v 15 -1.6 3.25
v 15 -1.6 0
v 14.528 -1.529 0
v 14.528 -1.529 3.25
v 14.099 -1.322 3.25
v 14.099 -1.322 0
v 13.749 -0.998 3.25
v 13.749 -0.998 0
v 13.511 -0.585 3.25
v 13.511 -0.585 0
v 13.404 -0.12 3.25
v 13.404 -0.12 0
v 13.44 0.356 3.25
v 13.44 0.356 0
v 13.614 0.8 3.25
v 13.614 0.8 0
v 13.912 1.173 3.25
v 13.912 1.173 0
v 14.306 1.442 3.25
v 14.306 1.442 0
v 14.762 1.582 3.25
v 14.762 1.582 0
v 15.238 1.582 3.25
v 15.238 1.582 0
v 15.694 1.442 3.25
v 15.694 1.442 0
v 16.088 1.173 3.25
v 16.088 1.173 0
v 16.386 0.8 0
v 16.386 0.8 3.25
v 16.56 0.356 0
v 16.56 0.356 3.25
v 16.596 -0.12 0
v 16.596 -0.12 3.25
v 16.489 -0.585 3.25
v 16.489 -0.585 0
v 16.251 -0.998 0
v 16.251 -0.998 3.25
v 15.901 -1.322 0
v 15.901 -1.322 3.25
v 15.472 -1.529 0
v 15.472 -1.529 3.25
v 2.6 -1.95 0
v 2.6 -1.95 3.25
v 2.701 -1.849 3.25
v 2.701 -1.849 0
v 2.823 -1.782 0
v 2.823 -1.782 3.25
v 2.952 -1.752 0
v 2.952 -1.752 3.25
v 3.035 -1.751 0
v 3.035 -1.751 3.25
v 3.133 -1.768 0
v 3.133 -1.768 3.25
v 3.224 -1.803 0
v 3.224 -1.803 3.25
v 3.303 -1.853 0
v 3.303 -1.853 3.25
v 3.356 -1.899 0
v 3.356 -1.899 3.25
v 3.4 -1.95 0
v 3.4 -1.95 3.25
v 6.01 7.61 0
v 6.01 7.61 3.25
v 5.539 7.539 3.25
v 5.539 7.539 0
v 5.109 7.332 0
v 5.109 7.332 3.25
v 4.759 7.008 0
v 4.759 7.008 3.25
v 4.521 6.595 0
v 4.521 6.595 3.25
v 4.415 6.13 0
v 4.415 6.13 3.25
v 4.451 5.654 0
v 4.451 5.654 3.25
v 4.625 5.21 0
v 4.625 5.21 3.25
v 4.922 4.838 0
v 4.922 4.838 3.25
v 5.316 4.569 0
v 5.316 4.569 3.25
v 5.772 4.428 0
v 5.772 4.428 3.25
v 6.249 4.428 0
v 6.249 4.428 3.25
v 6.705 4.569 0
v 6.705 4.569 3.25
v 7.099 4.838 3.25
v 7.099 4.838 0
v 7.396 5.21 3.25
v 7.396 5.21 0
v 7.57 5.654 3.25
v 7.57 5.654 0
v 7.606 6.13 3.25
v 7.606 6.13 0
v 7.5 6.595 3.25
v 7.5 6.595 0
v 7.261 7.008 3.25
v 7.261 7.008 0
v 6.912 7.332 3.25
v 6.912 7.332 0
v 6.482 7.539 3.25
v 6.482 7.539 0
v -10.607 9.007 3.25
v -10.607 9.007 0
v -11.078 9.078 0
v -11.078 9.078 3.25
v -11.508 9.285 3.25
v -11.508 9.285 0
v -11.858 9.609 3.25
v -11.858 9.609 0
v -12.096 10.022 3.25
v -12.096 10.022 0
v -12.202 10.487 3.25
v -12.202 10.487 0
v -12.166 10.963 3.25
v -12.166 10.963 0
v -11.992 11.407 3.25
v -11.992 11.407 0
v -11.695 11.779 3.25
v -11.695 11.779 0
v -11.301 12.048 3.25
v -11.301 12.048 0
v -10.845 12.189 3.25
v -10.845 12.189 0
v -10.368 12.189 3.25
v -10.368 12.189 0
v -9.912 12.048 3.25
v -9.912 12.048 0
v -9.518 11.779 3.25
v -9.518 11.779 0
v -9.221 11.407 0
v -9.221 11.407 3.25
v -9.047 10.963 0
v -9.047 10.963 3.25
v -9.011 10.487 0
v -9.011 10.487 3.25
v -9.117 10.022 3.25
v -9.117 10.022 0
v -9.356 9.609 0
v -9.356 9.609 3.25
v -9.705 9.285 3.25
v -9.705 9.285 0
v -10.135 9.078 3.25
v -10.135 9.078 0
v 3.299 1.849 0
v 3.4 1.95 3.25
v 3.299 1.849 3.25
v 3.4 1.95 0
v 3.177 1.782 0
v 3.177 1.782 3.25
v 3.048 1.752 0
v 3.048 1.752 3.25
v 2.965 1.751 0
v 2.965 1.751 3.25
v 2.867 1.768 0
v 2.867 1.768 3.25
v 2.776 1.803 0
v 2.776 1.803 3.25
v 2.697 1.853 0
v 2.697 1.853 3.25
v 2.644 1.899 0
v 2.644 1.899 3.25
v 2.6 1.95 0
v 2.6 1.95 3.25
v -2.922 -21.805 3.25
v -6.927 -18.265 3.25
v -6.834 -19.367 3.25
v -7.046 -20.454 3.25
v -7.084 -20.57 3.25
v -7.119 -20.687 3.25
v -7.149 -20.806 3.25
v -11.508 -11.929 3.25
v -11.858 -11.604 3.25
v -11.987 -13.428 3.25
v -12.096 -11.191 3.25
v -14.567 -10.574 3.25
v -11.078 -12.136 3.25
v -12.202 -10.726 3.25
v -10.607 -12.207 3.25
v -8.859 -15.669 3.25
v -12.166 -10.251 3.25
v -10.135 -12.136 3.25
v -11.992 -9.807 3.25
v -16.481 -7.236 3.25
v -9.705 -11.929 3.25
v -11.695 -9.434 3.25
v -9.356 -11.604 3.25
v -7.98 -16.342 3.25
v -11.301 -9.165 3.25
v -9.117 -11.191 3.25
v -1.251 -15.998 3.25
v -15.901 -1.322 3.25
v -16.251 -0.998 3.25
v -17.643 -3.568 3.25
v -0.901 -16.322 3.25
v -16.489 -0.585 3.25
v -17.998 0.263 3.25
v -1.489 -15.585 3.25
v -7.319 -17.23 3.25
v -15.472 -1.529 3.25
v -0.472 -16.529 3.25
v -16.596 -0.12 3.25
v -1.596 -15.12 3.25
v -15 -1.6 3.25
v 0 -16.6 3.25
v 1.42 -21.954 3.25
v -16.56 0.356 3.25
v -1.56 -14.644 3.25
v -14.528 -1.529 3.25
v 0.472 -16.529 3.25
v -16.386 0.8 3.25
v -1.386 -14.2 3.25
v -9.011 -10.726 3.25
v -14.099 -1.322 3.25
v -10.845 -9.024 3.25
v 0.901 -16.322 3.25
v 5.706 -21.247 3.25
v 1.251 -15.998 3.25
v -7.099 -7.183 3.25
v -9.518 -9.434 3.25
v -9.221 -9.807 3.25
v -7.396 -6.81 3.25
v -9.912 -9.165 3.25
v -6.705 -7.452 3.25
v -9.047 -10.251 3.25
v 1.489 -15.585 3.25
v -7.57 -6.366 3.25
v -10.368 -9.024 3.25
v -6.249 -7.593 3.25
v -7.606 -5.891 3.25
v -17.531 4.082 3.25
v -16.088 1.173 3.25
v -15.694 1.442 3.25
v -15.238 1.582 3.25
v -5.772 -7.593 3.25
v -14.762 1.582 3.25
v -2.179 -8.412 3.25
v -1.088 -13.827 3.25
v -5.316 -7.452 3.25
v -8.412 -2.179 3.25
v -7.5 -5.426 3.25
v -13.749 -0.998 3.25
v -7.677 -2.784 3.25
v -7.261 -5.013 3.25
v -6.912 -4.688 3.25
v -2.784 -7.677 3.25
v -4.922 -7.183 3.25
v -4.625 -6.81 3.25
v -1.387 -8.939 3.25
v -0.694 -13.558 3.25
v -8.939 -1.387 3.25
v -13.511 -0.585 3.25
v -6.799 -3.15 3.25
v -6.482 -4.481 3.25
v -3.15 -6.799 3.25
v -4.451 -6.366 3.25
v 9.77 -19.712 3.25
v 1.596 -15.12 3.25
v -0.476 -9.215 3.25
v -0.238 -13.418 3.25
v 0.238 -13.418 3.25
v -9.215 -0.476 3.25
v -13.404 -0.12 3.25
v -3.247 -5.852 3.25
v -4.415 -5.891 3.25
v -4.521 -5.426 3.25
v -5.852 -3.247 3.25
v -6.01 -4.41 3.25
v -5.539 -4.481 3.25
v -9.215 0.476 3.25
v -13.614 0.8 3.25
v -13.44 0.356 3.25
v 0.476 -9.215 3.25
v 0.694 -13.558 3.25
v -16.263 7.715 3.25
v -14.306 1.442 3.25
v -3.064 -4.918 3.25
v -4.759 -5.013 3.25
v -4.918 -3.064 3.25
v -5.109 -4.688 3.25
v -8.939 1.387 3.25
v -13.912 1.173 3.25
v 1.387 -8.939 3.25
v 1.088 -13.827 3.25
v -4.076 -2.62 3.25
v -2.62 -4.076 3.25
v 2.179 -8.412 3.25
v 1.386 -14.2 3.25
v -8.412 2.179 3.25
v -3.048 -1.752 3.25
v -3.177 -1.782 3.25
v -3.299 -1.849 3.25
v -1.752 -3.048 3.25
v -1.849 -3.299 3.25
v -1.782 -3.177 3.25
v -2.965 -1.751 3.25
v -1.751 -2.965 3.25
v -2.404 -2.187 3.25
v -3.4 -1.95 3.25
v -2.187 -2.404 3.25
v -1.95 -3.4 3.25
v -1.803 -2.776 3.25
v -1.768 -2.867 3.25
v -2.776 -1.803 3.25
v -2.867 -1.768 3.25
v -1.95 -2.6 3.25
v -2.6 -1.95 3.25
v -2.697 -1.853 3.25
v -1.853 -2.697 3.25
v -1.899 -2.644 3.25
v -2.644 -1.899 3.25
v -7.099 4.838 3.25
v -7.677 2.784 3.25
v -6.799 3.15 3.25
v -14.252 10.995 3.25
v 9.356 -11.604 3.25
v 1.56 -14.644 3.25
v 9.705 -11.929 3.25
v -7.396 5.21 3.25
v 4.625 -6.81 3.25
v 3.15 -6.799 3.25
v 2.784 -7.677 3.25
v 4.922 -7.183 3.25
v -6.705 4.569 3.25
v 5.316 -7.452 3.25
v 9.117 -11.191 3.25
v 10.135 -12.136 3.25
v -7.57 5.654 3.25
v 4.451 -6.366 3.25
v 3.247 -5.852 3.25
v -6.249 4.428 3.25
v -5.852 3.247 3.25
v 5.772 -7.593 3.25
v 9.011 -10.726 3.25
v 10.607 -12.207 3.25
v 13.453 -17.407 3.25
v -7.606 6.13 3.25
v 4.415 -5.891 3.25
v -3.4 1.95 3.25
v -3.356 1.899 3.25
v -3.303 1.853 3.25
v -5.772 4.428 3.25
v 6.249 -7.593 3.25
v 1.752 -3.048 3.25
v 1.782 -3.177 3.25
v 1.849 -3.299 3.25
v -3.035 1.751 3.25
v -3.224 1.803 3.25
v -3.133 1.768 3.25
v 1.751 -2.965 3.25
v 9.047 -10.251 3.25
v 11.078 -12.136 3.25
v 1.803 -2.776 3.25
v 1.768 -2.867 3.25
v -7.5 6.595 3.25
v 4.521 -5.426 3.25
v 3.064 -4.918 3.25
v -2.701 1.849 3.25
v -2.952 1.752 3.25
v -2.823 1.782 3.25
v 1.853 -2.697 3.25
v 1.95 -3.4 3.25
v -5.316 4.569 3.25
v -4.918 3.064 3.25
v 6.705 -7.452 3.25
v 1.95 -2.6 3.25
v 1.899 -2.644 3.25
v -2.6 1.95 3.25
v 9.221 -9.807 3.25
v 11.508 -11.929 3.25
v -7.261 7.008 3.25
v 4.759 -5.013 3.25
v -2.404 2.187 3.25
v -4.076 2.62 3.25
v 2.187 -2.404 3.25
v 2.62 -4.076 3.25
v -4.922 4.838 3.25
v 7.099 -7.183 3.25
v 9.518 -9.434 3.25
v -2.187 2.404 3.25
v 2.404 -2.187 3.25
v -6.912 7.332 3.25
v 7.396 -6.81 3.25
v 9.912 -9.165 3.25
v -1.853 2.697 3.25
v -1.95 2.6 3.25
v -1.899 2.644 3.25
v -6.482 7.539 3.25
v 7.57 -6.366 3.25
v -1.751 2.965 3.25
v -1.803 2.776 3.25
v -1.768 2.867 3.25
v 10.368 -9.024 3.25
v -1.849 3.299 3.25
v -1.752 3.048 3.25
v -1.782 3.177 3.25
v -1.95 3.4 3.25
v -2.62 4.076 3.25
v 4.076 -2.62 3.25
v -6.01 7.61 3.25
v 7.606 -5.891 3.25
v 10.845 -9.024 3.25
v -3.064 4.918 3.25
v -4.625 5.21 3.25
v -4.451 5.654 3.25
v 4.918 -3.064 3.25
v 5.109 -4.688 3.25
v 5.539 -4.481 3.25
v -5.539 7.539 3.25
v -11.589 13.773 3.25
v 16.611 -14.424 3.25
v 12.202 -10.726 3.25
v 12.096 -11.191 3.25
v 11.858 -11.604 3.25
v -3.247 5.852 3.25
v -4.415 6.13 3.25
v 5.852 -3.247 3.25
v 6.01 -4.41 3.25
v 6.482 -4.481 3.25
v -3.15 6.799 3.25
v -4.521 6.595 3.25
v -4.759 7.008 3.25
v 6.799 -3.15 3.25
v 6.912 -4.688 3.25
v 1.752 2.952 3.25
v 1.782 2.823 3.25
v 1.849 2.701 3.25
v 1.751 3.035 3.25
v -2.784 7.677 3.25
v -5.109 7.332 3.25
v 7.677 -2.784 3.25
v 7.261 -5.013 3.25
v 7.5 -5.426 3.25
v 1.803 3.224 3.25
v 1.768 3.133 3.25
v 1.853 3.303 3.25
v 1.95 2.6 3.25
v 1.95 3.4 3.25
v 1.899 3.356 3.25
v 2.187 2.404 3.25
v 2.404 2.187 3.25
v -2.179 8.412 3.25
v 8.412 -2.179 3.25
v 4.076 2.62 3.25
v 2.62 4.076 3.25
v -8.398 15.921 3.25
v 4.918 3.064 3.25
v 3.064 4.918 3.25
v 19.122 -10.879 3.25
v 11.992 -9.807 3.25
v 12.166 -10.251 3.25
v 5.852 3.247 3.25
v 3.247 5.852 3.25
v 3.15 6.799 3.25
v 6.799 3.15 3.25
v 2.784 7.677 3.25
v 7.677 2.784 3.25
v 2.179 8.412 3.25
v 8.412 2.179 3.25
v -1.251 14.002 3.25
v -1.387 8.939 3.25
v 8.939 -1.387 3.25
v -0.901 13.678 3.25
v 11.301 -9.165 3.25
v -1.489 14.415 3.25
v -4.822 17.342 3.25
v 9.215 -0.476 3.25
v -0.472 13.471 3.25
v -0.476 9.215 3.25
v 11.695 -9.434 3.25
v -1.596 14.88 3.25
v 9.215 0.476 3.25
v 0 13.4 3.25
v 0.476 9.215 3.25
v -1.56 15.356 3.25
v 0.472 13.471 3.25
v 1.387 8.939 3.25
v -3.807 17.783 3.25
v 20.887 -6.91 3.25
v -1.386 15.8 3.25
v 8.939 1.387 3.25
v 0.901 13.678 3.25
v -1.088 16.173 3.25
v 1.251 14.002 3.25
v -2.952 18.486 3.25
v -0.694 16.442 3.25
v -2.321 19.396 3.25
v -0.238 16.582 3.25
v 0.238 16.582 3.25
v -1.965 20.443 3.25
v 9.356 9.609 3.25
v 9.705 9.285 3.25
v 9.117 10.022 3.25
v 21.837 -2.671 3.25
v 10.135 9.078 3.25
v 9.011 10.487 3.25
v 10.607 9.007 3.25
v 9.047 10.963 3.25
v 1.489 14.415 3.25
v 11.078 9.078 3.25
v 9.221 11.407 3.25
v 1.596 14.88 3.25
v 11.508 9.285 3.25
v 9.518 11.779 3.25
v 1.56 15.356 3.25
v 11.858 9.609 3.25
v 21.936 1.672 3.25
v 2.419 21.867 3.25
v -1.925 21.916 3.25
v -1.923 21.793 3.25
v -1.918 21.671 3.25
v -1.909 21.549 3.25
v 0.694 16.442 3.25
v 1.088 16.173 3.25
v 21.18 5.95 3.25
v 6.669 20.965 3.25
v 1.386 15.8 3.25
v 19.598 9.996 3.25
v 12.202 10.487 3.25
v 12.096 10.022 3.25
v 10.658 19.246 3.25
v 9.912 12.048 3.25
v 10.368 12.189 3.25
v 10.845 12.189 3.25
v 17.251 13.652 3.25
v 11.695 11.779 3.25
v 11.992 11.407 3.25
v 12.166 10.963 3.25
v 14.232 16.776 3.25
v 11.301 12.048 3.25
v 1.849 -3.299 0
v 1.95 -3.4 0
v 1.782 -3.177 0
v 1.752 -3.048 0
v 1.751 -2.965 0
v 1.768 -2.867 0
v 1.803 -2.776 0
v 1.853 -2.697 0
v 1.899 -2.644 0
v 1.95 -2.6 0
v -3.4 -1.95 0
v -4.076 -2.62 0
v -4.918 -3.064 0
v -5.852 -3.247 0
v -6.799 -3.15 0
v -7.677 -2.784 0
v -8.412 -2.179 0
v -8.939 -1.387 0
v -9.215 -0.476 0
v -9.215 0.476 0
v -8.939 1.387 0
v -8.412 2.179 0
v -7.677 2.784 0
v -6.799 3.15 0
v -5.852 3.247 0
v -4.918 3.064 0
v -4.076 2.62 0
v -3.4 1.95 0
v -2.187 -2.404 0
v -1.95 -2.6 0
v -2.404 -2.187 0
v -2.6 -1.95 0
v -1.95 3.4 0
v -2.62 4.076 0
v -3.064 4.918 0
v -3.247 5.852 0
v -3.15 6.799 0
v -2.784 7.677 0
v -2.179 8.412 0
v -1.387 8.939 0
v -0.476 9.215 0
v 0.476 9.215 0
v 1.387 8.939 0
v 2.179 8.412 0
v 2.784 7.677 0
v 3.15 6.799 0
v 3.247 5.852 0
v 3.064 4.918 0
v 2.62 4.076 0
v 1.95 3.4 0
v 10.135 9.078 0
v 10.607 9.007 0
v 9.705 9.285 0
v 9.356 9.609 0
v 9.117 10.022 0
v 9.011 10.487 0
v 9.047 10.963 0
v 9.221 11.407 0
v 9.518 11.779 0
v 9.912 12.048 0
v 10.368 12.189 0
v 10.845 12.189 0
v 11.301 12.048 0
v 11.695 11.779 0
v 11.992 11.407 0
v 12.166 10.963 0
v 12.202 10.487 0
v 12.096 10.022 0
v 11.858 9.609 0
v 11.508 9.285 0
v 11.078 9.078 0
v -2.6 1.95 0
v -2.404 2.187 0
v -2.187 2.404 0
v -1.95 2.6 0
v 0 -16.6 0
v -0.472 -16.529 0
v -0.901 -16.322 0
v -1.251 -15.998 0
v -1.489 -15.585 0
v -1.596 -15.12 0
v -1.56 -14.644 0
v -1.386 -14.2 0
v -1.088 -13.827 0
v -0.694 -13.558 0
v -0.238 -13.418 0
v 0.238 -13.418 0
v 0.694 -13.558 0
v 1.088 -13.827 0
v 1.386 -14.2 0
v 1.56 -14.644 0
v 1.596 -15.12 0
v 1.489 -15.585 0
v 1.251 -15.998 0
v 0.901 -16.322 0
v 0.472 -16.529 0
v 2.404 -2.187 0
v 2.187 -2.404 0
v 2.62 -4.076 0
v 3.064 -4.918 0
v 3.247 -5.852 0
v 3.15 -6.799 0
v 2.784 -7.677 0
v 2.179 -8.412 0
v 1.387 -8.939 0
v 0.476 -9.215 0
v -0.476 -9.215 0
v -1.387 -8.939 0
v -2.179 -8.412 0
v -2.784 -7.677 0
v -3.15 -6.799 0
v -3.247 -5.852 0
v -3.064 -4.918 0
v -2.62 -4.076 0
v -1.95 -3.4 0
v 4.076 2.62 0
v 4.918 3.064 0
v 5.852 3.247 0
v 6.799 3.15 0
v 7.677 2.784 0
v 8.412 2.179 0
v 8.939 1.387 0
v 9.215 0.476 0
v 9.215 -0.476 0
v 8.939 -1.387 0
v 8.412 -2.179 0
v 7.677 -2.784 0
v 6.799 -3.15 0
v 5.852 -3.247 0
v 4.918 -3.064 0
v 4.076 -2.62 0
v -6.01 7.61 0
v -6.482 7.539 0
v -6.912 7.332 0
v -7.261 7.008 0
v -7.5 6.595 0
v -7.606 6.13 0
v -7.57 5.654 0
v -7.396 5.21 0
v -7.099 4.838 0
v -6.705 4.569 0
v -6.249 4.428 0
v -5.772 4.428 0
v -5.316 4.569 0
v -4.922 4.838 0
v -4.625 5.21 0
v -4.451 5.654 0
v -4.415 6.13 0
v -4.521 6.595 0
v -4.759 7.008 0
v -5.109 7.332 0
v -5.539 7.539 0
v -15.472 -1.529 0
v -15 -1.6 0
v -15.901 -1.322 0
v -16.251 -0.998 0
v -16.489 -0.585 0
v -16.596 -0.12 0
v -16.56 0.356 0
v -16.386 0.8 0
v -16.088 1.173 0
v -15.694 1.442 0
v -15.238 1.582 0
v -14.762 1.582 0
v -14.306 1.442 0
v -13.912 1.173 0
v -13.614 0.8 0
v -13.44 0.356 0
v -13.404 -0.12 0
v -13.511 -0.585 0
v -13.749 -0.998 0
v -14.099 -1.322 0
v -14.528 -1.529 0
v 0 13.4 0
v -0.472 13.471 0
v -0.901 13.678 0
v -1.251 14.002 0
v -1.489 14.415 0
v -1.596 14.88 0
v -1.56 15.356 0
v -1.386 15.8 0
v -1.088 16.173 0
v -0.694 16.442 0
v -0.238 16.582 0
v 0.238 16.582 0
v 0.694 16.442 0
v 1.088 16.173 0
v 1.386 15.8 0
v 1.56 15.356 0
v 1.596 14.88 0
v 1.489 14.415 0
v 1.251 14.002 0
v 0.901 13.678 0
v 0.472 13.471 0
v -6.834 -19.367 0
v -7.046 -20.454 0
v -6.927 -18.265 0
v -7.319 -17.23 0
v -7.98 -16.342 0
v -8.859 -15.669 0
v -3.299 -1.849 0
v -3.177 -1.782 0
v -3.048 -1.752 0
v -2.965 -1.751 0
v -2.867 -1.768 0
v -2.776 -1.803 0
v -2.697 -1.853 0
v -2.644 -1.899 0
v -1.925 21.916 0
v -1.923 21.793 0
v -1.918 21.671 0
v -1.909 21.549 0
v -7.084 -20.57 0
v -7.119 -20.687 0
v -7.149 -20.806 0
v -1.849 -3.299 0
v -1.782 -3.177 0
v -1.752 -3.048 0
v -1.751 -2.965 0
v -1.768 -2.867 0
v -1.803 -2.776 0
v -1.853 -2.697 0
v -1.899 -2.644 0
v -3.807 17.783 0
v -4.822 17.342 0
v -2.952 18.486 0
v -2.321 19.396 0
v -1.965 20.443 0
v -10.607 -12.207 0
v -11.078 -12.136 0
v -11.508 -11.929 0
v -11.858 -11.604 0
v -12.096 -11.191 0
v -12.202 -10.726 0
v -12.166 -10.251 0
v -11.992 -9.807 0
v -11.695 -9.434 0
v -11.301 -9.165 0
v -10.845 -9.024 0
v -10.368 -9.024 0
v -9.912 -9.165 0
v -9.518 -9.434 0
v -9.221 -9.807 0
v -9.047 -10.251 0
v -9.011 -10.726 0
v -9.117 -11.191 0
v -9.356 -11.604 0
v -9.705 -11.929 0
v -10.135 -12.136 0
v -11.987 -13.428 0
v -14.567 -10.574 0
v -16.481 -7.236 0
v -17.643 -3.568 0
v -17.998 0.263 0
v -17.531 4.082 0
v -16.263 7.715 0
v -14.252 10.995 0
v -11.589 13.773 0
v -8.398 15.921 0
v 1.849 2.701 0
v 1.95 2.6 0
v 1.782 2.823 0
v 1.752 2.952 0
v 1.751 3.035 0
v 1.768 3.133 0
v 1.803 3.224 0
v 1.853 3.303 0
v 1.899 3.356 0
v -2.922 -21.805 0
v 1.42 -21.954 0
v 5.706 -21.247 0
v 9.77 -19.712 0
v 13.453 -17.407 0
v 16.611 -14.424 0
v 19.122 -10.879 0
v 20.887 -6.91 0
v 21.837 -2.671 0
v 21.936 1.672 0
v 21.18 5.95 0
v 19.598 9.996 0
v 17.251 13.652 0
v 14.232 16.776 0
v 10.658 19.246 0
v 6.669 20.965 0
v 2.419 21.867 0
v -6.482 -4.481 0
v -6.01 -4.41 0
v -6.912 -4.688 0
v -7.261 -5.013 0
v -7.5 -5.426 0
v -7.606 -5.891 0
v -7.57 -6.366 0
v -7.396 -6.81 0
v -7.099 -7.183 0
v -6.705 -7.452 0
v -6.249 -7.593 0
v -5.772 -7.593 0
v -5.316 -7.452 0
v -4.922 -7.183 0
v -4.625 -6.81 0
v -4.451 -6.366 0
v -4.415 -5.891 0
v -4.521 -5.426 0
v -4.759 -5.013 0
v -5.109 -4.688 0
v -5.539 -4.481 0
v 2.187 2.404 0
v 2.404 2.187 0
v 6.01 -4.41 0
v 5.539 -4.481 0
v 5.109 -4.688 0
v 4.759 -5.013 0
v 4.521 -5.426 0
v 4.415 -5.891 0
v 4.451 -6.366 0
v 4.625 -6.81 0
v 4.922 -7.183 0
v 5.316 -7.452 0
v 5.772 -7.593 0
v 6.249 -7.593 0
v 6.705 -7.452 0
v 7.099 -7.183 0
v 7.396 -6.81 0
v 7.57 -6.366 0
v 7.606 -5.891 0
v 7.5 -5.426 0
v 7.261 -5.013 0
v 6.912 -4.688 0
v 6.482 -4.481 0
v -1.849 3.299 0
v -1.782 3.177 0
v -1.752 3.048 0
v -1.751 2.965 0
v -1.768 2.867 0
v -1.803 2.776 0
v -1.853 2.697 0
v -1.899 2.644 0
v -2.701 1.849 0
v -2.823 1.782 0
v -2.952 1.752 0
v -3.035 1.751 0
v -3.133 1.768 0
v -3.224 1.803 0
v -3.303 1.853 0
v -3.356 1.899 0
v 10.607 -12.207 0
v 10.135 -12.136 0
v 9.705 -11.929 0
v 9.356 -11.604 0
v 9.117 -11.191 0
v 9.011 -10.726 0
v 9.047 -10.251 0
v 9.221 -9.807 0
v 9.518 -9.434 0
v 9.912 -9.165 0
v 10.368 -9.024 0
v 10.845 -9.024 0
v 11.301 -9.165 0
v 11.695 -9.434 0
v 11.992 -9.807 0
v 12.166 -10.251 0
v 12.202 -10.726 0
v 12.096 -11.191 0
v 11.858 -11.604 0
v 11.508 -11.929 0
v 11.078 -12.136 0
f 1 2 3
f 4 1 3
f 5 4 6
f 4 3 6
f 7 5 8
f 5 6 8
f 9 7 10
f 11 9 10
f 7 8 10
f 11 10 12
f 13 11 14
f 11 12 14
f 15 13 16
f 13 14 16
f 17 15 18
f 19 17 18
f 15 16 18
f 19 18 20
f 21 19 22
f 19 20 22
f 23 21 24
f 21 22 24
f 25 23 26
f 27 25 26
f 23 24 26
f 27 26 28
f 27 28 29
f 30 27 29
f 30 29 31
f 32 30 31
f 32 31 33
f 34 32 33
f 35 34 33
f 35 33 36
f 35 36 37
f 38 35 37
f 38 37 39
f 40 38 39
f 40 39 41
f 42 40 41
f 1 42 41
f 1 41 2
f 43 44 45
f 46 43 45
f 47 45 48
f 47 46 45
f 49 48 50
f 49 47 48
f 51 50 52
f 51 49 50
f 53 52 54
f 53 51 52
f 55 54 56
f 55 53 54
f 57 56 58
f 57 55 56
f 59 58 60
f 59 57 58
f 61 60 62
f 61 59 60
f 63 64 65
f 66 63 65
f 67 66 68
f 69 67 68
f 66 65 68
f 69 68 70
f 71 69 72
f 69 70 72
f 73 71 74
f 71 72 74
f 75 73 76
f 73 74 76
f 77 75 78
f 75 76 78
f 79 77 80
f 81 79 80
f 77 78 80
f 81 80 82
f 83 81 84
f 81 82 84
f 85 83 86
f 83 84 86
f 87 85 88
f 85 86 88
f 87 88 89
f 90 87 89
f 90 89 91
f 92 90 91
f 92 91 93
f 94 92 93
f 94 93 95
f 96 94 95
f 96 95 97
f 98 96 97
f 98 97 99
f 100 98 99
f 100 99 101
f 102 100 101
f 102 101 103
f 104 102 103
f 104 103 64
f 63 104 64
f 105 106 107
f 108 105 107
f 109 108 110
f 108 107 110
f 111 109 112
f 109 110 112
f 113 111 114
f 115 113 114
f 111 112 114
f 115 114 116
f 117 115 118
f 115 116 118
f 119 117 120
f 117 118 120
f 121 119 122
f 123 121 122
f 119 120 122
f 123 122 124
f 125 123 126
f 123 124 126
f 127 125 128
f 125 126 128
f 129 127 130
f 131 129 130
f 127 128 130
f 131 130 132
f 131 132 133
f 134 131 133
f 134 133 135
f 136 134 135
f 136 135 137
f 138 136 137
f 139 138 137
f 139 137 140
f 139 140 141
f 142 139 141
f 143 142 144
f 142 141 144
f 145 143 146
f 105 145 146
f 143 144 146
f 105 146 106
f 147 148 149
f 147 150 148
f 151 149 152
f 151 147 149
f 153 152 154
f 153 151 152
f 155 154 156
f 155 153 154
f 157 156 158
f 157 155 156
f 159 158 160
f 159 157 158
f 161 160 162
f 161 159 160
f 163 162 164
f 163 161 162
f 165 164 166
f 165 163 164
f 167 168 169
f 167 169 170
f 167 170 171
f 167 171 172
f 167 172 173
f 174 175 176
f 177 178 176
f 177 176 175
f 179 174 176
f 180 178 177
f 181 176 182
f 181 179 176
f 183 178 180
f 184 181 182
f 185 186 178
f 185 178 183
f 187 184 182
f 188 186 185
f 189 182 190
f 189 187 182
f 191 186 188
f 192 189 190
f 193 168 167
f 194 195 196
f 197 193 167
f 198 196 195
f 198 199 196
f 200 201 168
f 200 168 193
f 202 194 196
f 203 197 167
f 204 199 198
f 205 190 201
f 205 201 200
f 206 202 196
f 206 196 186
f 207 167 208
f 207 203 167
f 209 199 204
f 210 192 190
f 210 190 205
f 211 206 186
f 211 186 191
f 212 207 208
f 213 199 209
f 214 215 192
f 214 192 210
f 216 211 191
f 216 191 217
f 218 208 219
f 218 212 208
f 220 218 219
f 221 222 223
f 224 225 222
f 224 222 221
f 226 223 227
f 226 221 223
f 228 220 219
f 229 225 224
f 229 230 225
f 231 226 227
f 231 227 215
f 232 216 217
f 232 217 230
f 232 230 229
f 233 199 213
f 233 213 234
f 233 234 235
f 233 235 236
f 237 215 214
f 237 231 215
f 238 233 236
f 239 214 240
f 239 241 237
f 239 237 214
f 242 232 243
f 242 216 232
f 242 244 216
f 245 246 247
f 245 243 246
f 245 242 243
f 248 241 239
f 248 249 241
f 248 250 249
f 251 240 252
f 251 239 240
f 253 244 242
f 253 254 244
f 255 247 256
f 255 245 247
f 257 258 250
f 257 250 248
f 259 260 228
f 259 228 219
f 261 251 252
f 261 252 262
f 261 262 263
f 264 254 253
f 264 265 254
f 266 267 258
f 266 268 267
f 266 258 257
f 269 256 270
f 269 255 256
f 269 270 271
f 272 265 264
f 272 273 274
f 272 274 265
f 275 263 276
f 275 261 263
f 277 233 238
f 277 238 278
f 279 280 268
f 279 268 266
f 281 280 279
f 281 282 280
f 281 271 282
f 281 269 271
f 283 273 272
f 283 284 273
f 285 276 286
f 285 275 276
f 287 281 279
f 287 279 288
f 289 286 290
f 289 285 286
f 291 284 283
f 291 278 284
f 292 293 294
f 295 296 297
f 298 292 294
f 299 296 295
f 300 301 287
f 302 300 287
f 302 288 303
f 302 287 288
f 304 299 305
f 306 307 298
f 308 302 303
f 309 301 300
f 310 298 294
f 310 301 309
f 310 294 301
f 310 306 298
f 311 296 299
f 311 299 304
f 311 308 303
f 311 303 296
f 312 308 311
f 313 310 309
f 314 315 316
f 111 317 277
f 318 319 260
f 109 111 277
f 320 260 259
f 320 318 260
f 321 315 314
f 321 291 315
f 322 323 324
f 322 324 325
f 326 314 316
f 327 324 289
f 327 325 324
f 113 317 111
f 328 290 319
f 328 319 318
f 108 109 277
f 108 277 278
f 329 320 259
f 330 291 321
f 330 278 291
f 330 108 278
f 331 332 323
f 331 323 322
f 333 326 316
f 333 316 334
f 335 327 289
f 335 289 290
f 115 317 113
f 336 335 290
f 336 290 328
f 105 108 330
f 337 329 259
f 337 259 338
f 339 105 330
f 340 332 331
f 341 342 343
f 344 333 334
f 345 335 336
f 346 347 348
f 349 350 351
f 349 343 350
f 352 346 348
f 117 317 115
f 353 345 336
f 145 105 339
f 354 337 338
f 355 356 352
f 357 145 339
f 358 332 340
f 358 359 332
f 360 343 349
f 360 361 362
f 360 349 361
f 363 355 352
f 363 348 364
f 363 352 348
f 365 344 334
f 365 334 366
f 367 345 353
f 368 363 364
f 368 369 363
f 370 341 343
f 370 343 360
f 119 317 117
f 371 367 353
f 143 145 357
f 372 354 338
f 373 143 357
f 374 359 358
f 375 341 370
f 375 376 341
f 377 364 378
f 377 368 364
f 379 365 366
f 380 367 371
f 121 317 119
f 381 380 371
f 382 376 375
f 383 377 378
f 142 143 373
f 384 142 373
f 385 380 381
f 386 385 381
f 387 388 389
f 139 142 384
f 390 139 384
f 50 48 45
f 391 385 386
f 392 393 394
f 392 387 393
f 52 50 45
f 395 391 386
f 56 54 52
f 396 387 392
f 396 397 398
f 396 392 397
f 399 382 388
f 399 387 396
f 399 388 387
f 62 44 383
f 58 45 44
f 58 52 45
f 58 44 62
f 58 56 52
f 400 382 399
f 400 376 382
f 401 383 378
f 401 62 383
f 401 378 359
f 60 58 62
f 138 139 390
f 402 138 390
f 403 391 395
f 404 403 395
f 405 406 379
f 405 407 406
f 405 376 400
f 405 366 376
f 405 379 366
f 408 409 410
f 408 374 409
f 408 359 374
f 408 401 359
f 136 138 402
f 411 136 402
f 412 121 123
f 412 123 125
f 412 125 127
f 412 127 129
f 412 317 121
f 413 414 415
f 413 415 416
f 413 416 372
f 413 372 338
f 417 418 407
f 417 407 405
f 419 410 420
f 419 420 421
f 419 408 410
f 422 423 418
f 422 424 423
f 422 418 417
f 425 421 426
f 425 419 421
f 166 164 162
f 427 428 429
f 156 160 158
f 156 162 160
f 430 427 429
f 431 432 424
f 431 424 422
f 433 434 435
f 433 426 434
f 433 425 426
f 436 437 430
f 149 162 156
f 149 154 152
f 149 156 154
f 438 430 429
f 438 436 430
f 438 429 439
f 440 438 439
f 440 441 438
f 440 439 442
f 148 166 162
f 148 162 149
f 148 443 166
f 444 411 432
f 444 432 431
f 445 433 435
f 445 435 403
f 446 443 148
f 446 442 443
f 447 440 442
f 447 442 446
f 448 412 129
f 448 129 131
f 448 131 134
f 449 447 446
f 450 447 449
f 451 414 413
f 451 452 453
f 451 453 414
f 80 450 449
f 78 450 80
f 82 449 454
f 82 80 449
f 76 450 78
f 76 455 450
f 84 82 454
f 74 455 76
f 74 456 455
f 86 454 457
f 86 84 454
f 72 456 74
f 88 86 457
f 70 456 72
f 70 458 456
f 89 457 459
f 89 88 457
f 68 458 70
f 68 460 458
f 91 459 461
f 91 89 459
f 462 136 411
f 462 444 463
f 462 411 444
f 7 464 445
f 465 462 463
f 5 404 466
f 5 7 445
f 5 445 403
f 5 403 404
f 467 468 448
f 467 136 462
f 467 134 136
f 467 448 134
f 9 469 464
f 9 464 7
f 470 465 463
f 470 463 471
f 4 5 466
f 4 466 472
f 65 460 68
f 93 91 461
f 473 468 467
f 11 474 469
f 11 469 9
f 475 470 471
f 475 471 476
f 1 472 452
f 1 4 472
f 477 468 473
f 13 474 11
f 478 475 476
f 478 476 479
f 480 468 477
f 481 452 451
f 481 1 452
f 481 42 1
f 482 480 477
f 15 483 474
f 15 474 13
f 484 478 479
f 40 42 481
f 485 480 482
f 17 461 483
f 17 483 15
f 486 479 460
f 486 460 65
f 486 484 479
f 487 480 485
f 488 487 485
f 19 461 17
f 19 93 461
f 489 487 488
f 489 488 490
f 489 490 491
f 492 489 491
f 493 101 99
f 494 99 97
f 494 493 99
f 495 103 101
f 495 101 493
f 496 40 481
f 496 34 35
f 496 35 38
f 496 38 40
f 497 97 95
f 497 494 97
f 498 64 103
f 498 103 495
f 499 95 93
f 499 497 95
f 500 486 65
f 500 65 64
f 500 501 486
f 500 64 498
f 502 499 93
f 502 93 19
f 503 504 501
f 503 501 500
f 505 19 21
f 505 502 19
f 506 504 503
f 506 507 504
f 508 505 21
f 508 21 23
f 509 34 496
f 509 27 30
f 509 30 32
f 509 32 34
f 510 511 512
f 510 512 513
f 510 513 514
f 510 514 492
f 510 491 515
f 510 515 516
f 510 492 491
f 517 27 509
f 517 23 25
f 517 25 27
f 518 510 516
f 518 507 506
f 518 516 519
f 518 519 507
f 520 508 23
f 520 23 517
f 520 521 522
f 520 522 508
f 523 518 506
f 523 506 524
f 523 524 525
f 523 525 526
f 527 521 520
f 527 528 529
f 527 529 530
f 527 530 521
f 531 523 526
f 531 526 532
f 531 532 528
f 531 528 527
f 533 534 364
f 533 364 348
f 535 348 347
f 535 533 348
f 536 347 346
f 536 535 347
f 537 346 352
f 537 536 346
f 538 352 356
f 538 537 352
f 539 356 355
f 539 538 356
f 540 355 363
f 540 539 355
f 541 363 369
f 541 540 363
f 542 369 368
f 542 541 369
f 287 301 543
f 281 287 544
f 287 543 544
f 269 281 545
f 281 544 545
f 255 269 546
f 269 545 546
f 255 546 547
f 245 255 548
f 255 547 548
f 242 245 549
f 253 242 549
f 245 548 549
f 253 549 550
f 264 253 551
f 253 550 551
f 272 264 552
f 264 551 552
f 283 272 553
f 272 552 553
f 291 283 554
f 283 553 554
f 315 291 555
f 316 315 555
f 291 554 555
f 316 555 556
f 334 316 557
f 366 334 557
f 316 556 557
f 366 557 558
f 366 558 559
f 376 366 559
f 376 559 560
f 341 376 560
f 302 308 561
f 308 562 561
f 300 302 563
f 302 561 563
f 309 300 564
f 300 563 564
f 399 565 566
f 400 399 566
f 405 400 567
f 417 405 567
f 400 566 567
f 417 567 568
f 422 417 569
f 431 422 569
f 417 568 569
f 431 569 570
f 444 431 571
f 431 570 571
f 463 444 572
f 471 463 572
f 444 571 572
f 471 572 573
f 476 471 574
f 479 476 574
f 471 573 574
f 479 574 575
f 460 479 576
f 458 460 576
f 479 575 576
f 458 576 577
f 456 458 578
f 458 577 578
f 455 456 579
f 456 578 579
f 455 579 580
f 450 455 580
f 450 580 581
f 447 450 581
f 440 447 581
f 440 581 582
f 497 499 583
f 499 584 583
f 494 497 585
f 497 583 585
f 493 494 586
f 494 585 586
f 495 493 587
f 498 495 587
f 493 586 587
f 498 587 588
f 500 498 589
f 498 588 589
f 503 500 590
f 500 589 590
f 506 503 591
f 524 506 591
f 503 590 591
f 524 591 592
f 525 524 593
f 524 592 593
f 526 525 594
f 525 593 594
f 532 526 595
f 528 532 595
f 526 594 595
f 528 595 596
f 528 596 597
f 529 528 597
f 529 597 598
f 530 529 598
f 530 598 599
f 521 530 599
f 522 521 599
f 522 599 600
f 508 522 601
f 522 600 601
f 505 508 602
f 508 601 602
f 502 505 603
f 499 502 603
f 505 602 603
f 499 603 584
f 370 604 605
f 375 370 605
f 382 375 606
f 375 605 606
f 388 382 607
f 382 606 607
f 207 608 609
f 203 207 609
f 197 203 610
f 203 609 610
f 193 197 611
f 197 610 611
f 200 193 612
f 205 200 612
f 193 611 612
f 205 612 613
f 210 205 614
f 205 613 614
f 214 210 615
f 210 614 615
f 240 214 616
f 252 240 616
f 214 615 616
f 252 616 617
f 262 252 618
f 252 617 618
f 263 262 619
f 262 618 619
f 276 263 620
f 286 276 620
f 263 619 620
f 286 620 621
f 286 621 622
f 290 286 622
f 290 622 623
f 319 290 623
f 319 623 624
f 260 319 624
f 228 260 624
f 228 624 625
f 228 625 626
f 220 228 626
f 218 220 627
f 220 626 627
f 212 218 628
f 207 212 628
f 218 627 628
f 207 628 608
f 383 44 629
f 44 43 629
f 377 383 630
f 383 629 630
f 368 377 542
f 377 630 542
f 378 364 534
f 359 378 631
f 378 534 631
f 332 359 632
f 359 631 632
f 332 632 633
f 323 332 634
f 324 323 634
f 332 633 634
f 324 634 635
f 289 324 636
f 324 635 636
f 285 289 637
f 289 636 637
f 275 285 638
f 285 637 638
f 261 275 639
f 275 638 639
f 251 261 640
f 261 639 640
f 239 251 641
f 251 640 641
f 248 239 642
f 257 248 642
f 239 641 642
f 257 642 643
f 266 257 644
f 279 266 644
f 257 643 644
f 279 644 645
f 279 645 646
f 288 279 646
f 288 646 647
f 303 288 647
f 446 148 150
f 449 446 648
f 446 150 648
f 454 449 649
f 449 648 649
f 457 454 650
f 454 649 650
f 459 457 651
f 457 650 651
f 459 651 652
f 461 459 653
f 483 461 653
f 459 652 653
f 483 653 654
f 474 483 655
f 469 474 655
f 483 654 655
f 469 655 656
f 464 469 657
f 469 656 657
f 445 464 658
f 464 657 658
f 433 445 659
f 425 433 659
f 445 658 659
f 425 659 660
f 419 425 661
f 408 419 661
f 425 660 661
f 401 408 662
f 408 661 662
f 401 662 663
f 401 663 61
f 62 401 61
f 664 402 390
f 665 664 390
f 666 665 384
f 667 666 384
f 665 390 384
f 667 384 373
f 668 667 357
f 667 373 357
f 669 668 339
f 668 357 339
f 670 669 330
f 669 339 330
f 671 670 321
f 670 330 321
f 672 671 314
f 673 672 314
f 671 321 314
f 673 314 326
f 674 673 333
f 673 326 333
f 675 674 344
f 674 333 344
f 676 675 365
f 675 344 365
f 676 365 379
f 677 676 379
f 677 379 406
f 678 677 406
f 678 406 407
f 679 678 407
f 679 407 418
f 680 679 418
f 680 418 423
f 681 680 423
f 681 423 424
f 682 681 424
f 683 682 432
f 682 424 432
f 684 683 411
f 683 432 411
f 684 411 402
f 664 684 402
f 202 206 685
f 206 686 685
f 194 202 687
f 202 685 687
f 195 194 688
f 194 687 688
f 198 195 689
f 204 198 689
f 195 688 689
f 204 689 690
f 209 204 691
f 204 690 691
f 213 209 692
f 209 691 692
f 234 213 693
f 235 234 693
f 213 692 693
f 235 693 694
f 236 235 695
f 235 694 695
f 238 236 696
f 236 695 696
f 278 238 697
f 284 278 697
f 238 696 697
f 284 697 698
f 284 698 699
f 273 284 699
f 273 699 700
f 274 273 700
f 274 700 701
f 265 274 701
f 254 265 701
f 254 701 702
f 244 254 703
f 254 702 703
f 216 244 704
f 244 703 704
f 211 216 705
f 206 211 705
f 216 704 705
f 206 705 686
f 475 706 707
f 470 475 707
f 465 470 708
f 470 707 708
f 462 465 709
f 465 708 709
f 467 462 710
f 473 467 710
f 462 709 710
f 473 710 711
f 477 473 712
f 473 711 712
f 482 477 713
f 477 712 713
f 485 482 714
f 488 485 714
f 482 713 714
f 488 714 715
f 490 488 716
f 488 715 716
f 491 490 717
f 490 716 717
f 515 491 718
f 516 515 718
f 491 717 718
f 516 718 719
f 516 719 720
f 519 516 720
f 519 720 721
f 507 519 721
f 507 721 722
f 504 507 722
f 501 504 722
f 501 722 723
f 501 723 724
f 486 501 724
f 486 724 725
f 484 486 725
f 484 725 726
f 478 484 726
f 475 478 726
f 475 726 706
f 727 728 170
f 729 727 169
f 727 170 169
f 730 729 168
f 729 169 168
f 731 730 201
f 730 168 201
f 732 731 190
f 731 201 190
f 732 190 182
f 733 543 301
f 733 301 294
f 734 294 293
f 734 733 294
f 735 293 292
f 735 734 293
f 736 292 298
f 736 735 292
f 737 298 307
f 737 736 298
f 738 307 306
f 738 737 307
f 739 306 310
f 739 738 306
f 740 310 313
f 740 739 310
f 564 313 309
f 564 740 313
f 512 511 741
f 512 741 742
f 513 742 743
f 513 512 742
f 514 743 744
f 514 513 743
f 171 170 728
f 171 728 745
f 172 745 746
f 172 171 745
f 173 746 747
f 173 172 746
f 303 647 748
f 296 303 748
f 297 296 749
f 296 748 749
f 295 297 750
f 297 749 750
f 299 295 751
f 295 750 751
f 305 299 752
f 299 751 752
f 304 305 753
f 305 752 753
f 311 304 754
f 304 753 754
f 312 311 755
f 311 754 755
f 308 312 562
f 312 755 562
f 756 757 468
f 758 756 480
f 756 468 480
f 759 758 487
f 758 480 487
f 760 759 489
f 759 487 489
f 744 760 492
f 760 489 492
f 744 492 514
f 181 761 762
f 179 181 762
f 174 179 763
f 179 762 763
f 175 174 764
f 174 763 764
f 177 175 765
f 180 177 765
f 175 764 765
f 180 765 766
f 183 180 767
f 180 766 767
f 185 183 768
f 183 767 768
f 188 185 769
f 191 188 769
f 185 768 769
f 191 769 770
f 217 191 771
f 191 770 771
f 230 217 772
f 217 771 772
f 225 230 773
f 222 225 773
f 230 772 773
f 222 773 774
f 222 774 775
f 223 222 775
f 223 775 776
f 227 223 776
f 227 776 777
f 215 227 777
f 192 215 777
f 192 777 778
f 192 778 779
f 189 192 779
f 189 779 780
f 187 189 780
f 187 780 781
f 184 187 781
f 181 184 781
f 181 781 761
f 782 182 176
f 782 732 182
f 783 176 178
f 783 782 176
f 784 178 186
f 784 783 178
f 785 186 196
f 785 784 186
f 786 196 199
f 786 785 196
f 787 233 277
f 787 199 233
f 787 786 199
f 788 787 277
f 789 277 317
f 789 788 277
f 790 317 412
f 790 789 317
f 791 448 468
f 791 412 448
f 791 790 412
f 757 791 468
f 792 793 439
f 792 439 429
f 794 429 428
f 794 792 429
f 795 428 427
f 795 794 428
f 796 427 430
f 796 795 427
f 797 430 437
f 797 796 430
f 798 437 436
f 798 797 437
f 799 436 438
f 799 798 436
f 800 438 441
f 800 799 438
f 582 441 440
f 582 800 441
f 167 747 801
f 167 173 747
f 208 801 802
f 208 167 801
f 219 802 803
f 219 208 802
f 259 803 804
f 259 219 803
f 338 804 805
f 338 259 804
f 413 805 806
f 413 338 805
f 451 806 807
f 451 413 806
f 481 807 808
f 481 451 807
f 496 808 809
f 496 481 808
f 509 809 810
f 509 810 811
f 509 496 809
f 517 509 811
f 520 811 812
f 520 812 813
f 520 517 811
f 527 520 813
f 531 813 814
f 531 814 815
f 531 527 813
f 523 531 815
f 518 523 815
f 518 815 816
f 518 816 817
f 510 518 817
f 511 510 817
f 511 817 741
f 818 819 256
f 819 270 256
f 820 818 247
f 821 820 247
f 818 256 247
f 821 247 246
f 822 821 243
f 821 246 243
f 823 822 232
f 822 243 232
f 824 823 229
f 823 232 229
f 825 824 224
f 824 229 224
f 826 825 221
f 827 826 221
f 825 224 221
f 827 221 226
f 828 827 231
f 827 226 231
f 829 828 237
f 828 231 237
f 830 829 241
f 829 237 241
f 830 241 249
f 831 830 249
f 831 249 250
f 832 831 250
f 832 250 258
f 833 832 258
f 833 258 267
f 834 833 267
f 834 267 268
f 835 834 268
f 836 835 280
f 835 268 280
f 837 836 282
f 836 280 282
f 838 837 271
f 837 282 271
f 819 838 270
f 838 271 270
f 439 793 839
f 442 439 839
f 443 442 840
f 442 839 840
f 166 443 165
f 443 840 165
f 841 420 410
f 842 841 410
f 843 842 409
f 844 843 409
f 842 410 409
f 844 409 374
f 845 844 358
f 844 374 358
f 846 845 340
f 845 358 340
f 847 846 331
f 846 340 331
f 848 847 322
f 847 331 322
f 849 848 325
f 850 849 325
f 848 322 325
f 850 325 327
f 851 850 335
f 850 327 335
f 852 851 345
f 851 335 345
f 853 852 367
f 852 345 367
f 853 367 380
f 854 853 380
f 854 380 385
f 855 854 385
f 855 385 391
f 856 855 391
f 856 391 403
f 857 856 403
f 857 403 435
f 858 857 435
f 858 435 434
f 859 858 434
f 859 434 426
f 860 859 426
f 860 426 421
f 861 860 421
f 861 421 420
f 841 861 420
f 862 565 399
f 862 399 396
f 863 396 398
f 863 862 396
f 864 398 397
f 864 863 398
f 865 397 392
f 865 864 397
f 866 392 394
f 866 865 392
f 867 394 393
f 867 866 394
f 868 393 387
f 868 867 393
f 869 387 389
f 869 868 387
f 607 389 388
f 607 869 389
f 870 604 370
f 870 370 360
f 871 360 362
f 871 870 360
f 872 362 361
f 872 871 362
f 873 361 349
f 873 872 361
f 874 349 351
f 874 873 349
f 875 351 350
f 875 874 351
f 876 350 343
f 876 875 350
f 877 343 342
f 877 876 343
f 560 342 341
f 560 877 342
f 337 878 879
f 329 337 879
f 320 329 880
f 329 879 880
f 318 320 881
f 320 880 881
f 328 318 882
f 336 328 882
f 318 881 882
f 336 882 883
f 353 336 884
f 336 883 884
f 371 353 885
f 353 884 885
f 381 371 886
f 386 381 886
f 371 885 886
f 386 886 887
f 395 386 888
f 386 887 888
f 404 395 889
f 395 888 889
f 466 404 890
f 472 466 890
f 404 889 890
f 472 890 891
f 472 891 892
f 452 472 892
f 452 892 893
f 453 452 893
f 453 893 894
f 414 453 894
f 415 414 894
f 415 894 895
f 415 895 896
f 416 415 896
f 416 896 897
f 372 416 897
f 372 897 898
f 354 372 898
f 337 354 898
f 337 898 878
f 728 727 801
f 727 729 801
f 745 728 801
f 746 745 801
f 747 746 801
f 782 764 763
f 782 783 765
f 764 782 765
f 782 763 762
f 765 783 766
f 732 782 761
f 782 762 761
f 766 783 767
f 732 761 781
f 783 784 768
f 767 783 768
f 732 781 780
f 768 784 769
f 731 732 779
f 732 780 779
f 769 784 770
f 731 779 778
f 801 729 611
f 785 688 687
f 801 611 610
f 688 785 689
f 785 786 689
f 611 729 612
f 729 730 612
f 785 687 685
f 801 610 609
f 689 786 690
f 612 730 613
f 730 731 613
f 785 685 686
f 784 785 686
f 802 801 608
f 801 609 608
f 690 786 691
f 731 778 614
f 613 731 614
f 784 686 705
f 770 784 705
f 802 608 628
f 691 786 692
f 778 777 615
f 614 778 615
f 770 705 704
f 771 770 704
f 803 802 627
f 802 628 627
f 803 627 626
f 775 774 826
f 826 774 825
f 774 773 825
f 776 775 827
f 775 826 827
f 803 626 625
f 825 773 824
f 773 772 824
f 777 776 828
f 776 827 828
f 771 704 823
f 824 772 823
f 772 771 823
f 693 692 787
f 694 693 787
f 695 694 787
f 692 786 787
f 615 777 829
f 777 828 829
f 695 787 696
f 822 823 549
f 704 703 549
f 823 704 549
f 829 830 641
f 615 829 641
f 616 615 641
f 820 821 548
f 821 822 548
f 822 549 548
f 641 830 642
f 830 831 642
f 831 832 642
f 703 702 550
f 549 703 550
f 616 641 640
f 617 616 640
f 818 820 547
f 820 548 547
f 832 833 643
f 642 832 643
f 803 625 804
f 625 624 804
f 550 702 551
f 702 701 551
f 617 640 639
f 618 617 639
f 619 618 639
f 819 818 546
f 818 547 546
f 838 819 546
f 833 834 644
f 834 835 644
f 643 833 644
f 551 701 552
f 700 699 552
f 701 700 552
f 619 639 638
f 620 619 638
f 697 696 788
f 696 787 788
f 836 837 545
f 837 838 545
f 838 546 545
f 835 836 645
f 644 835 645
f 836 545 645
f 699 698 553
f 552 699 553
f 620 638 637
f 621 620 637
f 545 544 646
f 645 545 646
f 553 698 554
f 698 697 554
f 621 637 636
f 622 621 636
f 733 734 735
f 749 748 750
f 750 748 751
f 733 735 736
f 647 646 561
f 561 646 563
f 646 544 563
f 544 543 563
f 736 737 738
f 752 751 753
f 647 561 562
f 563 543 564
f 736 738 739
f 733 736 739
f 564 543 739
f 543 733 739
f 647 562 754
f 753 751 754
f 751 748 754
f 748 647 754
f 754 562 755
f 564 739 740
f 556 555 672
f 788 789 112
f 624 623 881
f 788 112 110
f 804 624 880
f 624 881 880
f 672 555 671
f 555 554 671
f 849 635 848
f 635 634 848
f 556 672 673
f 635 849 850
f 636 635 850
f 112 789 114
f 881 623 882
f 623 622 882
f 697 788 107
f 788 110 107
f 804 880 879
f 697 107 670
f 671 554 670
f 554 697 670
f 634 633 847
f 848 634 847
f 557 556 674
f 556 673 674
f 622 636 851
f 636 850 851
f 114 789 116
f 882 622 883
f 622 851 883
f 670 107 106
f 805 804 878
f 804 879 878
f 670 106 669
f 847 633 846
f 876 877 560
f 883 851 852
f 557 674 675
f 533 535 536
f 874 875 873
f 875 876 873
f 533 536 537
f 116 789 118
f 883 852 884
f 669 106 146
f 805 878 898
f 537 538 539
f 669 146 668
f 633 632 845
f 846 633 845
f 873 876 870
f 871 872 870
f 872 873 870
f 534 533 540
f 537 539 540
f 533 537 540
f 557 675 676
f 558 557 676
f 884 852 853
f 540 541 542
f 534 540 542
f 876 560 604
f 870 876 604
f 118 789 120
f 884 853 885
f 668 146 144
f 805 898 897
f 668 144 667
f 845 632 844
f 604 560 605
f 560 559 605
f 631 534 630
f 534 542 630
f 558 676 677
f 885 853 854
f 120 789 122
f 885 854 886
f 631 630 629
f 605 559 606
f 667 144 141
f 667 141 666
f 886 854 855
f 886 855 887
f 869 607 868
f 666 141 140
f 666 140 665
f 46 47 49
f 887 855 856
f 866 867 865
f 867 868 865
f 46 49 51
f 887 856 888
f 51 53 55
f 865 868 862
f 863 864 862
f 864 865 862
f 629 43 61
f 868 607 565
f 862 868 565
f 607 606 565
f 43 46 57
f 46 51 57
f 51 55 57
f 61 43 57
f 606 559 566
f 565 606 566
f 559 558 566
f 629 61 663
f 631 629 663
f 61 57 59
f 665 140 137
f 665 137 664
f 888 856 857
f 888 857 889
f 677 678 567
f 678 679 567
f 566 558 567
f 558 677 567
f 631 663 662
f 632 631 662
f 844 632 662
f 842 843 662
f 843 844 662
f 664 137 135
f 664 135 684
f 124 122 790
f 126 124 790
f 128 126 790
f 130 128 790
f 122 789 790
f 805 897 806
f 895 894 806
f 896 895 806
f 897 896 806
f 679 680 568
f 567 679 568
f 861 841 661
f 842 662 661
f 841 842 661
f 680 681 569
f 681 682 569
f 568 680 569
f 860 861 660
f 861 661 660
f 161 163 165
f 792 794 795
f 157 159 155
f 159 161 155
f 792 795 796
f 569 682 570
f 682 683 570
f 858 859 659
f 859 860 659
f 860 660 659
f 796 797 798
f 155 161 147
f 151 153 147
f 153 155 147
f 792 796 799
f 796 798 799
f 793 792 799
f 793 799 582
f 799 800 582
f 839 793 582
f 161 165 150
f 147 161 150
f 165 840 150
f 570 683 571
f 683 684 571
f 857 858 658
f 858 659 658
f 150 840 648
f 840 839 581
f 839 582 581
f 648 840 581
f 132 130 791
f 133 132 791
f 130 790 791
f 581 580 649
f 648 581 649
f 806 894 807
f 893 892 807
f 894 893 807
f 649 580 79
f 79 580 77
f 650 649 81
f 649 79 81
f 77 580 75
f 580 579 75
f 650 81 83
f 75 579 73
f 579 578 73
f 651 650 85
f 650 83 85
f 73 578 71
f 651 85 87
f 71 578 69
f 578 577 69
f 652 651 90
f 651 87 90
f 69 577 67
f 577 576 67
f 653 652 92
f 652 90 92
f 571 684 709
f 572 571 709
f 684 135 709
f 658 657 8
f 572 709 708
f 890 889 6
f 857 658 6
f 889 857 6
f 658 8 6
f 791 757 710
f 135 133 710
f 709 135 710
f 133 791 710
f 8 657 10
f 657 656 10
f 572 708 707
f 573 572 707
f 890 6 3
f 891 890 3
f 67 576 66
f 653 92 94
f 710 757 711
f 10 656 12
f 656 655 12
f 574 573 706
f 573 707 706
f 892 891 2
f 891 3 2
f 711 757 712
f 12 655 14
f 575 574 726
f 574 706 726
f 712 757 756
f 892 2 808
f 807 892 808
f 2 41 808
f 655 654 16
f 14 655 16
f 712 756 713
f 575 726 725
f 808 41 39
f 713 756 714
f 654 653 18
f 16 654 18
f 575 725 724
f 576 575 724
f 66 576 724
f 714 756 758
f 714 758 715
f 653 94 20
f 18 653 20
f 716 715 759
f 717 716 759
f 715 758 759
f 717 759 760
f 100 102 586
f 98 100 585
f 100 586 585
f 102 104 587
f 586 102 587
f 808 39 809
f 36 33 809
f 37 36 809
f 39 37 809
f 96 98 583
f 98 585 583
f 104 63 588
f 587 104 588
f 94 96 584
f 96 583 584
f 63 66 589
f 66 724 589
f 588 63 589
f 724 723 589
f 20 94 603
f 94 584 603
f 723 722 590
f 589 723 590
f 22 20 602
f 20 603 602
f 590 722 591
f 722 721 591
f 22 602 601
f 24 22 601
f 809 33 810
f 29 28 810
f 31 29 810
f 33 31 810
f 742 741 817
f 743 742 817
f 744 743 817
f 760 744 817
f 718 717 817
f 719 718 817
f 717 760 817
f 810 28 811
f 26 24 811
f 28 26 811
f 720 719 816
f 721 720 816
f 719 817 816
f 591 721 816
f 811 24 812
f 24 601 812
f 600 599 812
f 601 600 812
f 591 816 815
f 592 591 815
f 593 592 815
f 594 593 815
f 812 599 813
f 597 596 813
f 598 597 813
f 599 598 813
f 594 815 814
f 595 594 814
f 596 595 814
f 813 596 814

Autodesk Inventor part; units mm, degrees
ref_plane "YZ Plane" through (0, 0, 0) normal (1, 0, 0) x (0, 1, 0)
ref_plane "XZ Plane" through (0, 0, 0) normal (0, 1, 0) x (-1, 0, 0)
ref_plane "XY Plane" through (0, 0, 0) normal (0, 0, 1) x (1, 0, 0)
sketch "スケッチ1" plane through (0, 0, 0) normal (0, 0, 1) x (1, 0, 0)
  circle A0 centre (0, 0) radius 18
  dimension "d0" = 36
extrude "押し出し1" add sketch "スケッチ1" along normal blind 3.25
sketch "スケッチ2" plane through (0, 0, 3.25) normal (0, 0, 1) x (1, 0, 0)
  circle A0 centre (0, 0) radius 6
  point P0 (0, 6)
  point P1 (-6, 0)
  point P2 (0, -6)
  point P3 (6, 0)
  dimension "d3" = 12
  dimension "d6" = 360
hole "穴1" at (0, 6, 3.25) at (-6, 0, 3.25) at (0, -6, 3.25) at (6, 0, 3.25) direction (0, 0, -1) diameter 3.2 end through all counterbore diameter 6.5 counterbore depth 4 clearance for "Socket Head Cap Screw" size "M3" standard "Ansi Metric M Profile"
sketch "スケッチ3" plane through (0, 0, 0) normal (0, 0, -1) x (-1, 0, 0)
  circle A0 centre (0, 0) radius 8.5
  point P0 (-6.0104, 6.0104)
  point P1 (-6.0104, -6.0104)
  point P2 (6.0104, -6.0104)
  point P3 (6.0104, 6.0104)
  dimension "d15" = 17
  dimension "d50" = 8
  dimension "d18" = 360
hole "穴2" at (6.0104, 6.0104, 0) at (6.0104, -6.0104, 0) at (-6.0104, -6.0104, 0) at (-6.0104, 6.0104, 0) direction (0, 0, 1) diameter 3.2 end through all clearance for "Socket Head Cap Screw" size "M3" standard "Ansi Metric M Profile"
sketch "スケッチ4" plane through (0, 0, 0) normal (0, 0, -1) x (-1, 0, 0)
  circle A0 centre (0, 0) radius 3.25
  dimension "d27" = 6.5
extrude "押し出し2" cut sketch "スケッチ4" against normal blind 8
fillet "フィレット1" radius 0.5 8 edges at (-1.25, -3, 1.625) (1.25, -3, 1.625) (3, -1.25, 1.625) (3, 1.25, 1.625) (1.25, 3, 1.625) (-1.25, 3, 1.625) (-3, 1.25, 1.625) (-3, -1.25, 1.625)
sketch "スケッチ5" plane through (0, 0, 3.25) normal (0, 0, 1) x (1, 0, 0)
  circle A0 centre (0, 0) radius 15
  point P0 (0, -15)
  point P1 (10.6066, -10.6066)
  point P2 (15, 0)
  point P3 (10.6066, 10.6066)
  point P4 (0, 15)
  point P5 (-10.6066, 10.6066)
  point P6 (-15, 0)
  point P7 (-10.6066, -10.6066)
  dimension "d31" = 30
  dimension "d34" = 360
hole "穴3" at (0, -15, 3.25) at (10.6066, -10.6066, 3.25) at (15, 0, 3.25) at (10.6066, 10.6066, 3.25) at (0, 15, 3.25) at (-10.6066, 10.6066, 3.25) at (-15, 0, 3.25) at (-10.6066, -10.6066, 3.25) direction (0, 0, -1) diameter 3.2 end through all clearance for "Socket Head Cap Screw" size "M3" standard "Ansi Metric M Profile"
sketch "スケッチ6" plane through (0, 0, 3.25) normal (0, 0, 1) x (1, 0, 0)
  circle A0 centre (2.0753, 21.9019) radius 4
  circle A1 centre (-17, 14) radius 4 construction
  circle A2 centre (-3.264, -21.7565) radius 4
  circle A3 centre (0, 0) radius 18 projected
  line L0 (-3.264, -21.7565) -> (0, 0) construction
  circle A4 centre (-20.8592, 6.9924) radius 4 construction
  circle A5 centre (-10.8624, 19.1313) radius 4 construction
  line L1 (-10.8624, 19.1313) -> (0, 0) construction
  line L2 (0, 0) -> (-20.8592, 6.9924) construction
  line L3 (0, 0) -> (2.0753, 21.9019) construction
  arc A6 (-3.8575, -25.7123) -> (2.4526, 25.8841) centre (0, 0) ccw
  circle A7 centre (0, 0) radius 18 projected
  circle A8 centre (-5.8935, 21.1959) radius 4
  circle A9 centre (-10.8278, -19.1509) radius 4
  circle A10 centre (0, 0) radius 22
  point P0 (1.698, 17.9197)
  point P1 (-2.6705, -17.8008)
  point P2 (-1.9091, 21.5489)
  point P3 (-7.1494, -20.8059)
  point P4 (-1.9091, 21.5489)
  point P5 (-4.822, 17.3421)
  point P6 (-8.8591, -15.669)
  point P7 (-7.0459, -20.4537)
  point P8 (-1.9247, 21.9156)
  dimension "d59" = 44
  dimension "d45" = 17
  dimension "d46" = 14
  dimension "d47" = 8
  dimension "d48" = 8
  dimension "d49" = 8
  dimension "d50" = 8
  dimension "d51" = 8
  dimension "d52" = 35
  dimension "d53" = 100
  dimension "d57" = 8
  dimension "d58" = 8
extrude "押し出し3" add sketch "スケッチ6" against normal up to surface (3.25 mm away) contours A10 A2 A3 A0 | A0 A10 | A3 A8 A0 | A2 A10 | A9 A3 A2 picked at (1.947, 20.5476) picked at (-3.0622, -20.4112)
properties part number "s_base5" material "ABS プラスチック"
